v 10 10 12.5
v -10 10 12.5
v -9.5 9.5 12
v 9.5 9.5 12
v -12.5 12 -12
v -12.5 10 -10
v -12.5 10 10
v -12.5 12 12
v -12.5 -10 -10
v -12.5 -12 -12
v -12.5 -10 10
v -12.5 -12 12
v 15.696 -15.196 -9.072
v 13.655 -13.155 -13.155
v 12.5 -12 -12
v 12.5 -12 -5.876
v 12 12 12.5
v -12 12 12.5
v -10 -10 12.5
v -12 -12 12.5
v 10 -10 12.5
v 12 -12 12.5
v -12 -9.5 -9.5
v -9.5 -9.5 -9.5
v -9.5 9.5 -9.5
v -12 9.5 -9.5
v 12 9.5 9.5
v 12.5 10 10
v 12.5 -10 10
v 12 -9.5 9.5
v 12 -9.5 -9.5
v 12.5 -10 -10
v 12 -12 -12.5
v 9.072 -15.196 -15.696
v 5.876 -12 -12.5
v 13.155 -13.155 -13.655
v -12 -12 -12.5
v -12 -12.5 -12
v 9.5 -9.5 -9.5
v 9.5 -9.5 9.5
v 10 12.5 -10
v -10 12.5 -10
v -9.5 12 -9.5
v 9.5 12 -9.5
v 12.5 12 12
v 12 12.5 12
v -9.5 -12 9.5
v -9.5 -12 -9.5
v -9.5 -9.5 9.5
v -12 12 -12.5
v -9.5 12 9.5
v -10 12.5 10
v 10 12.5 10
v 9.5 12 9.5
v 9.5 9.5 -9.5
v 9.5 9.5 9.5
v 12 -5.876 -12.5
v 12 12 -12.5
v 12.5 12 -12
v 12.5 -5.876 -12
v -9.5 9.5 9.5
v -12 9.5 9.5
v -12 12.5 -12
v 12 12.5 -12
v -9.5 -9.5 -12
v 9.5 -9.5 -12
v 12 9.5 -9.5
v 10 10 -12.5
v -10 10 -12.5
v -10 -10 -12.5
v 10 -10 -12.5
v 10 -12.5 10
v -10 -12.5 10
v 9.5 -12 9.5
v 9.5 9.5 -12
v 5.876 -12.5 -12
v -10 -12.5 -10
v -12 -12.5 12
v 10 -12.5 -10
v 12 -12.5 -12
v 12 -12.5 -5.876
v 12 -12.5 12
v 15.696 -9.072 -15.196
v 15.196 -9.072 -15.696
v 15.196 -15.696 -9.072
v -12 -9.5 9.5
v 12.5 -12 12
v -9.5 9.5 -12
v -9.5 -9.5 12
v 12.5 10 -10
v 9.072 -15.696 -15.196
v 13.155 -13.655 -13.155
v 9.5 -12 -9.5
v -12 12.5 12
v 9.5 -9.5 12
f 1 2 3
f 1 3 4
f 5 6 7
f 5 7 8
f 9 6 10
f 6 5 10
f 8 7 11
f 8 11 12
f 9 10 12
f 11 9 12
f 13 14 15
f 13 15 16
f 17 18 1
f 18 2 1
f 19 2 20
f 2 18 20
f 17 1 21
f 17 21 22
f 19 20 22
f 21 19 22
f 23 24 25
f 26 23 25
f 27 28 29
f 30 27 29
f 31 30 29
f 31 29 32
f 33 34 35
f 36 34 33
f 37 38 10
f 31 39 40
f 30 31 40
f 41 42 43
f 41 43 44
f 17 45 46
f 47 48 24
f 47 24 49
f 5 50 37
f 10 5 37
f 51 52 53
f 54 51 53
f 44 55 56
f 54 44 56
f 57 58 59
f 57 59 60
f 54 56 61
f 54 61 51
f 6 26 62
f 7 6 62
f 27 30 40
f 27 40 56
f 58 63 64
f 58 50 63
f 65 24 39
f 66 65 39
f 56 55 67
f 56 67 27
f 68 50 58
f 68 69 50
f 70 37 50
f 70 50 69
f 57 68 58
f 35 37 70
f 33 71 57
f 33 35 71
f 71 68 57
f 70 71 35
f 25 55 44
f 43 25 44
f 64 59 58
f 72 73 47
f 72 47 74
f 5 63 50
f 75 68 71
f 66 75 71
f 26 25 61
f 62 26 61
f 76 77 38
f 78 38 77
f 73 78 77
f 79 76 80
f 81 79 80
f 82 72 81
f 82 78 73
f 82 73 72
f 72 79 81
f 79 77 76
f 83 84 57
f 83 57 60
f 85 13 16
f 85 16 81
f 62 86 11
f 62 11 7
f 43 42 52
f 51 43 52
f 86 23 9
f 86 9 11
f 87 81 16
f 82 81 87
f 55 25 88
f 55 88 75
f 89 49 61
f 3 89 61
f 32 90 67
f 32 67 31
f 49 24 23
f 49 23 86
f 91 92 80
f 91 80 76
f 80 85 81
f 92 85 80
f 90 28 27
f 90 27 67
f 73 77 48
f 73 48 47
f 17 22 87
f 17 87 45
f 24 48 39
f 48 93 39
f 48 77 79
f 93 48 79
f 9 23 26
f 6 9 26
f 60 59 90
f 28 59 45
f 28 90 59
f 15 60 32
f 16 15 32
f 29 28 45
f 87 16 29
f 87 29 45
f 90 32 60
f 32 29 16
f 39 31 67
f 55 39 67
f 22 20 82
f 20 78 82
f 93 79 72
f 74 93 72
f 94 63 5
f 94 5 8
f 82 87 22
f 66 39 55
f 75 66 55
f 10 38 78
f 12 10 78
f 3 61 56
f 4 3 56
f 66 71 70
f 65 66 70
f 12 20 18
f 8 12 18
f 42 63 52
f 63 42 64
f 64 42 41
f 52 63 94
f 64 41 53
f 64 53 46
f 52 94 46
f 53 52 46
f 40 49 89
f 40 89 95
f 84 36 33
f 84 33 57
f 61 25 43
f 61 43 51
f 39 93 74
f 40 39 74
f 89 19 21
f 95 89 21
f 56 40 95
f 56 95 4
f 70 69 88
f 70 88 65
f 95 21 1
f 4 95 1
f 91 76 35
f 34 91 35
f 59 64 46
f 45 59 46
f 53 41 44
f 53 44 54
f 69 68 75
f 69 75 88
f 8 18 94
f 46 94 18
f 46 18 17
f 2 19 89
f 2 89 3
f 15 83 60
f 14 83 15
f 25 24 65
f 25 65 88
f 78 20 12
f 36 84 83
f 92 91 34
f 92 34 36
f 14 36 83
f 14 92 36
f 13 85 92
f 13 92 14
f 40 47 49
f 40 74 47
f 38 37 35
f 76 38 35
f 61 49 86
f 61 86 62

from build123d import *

# Parameters (mm, degrees)
F0_W          = 25
F0_H          = 25
F0_W_2        = 19
F0_H_2        = 19
F1_DEPTH      = 12.5
F1_DEPTH_BACK = 12.5
F2_W          = 19
F2_H          = 19
F3_DEPTH      = 25
F3_DEPTH_BACK = 25
F4_W          = 19
F4_H          = 19
F5_DEPTH      = 25
F5_DEPTH_BACK = 25
F6_SIZE       = 0.5
F9_DEPTH      = 5.5355339059


with BuildPart() as f1:
    # F0 (on Front) → F1 (new body, two sides)
    with BuildSketch(Plane.XZ) as f1_sk:
        Rectangle(F0_W, F0_H)
        Rectangle(F0_W_2, F0_H_2, mode=Mode.SUBTRACT)
    extrude(amount=F1_DEPTH)
    extrude(f1_sk.sketch, amount=-F1_DEPTH_BACK)

    # F2 (on Right) → F3 (cut, two sides)
    with BuildSketch(Plane.YZ) as f3_sk:
        Rectangle(F2_W, F2_H)
    extrude(amount=-F3_DEPTH, mode=Mode.SUBTRACT)
    extrude(f3_sk.sketch, amount=F3_DEPTH_BACK, mode=Mode.SUBTRACT)

    # F4 (on Top) → F5 (cut, two sides)
    with BuildSketch(Plane.XY) as f5_sk:
        Rectangle(F4_W, F4_H)
    extrude(amount=-F5_DEPTH, mode=Mode.SUBTRACT)
    extrude(f5_sk.sketch, amount=F5_DEPTH_BACK, mode=Mode.SUBTRACT)

    # F6
    f6_edges = [f1.edges().sort_by_distance(p)[0] for p in [
        (12.5, -12.5, 0),
        (12.5, 0, -12.5),
        (12.5, 0, 12.5),
        (12.5, 12.5, 0),
        (12.5, 0, -9.5),
        (12.5, -9.5, 0),
        (12.5, 0, 9.5),
        (12.5, 9.5, 0),
        (0, -12.5, 12.5),
        (-12.5, 0, 12.5),
        (0, 12.5, 12.5),
        (9.5, 0, 12.5),
        (0, -9.5, 12.5),
        (-9.5, 0, 12.5),
        (0, 9.5, 12.5),
        (0, -12.5, -12.5),
        (-12.5, -12.5, 0),
        (9.5, -12.5, 0),
        (0, -12.5, -9.5),
        (-9.5, -12.5, 0),
        (0, -12.5, 9.5),
        (0, 12.5, -12.5),
        (-12.5, 12.5, 0),
        (9.5, 12.5, 0),
        (0, 12.5, -9.5),
        (-9.5, 12.5, 0),
        (0, 12.5, 9.5),
        (-12.5, 0, -12.5),
        (-12.5, 0, -9.5),
        (-12.5, 9.5, 0),
        (-12.5, 0, 9.5),
        (-12.5, -9.5, 0),
        (9.5, 0, -12.5),
        (0, 9.5, -12.5),
        (-9.5, 0, -12.5),
        (0, -9.5, -12.5),
    ]]
    chamfer(f6_edges, length=F6_SIZE)

    # F8 (on offset) → F9 (join, through all)
    with BuildSketch(Plane(origin=(13.321367205, -13.321367205, -13.321367205), x_dir=(0.8164965809, 0.4082482905, 0.4082482905), z_dir=(0.5773502692, -0.5773502692, -0.5773502692))):
        Polygon((2.9082482905, -4.3301270189), (0.4082482905, 0), (2.9082482905, 4.3301270189), (2.2958758548, 4.6836804095), (-0.2041241452, 0.3535533906), (-5.2041241452, 0.3535533906), (-5.2041241452, -0.3535533906), (-0.2041241452, -0.3535533906), (2.2958758548, -4.6836804095), align=None)
    extrude(amount=-F9_DEPTH)


solid = f1.part
